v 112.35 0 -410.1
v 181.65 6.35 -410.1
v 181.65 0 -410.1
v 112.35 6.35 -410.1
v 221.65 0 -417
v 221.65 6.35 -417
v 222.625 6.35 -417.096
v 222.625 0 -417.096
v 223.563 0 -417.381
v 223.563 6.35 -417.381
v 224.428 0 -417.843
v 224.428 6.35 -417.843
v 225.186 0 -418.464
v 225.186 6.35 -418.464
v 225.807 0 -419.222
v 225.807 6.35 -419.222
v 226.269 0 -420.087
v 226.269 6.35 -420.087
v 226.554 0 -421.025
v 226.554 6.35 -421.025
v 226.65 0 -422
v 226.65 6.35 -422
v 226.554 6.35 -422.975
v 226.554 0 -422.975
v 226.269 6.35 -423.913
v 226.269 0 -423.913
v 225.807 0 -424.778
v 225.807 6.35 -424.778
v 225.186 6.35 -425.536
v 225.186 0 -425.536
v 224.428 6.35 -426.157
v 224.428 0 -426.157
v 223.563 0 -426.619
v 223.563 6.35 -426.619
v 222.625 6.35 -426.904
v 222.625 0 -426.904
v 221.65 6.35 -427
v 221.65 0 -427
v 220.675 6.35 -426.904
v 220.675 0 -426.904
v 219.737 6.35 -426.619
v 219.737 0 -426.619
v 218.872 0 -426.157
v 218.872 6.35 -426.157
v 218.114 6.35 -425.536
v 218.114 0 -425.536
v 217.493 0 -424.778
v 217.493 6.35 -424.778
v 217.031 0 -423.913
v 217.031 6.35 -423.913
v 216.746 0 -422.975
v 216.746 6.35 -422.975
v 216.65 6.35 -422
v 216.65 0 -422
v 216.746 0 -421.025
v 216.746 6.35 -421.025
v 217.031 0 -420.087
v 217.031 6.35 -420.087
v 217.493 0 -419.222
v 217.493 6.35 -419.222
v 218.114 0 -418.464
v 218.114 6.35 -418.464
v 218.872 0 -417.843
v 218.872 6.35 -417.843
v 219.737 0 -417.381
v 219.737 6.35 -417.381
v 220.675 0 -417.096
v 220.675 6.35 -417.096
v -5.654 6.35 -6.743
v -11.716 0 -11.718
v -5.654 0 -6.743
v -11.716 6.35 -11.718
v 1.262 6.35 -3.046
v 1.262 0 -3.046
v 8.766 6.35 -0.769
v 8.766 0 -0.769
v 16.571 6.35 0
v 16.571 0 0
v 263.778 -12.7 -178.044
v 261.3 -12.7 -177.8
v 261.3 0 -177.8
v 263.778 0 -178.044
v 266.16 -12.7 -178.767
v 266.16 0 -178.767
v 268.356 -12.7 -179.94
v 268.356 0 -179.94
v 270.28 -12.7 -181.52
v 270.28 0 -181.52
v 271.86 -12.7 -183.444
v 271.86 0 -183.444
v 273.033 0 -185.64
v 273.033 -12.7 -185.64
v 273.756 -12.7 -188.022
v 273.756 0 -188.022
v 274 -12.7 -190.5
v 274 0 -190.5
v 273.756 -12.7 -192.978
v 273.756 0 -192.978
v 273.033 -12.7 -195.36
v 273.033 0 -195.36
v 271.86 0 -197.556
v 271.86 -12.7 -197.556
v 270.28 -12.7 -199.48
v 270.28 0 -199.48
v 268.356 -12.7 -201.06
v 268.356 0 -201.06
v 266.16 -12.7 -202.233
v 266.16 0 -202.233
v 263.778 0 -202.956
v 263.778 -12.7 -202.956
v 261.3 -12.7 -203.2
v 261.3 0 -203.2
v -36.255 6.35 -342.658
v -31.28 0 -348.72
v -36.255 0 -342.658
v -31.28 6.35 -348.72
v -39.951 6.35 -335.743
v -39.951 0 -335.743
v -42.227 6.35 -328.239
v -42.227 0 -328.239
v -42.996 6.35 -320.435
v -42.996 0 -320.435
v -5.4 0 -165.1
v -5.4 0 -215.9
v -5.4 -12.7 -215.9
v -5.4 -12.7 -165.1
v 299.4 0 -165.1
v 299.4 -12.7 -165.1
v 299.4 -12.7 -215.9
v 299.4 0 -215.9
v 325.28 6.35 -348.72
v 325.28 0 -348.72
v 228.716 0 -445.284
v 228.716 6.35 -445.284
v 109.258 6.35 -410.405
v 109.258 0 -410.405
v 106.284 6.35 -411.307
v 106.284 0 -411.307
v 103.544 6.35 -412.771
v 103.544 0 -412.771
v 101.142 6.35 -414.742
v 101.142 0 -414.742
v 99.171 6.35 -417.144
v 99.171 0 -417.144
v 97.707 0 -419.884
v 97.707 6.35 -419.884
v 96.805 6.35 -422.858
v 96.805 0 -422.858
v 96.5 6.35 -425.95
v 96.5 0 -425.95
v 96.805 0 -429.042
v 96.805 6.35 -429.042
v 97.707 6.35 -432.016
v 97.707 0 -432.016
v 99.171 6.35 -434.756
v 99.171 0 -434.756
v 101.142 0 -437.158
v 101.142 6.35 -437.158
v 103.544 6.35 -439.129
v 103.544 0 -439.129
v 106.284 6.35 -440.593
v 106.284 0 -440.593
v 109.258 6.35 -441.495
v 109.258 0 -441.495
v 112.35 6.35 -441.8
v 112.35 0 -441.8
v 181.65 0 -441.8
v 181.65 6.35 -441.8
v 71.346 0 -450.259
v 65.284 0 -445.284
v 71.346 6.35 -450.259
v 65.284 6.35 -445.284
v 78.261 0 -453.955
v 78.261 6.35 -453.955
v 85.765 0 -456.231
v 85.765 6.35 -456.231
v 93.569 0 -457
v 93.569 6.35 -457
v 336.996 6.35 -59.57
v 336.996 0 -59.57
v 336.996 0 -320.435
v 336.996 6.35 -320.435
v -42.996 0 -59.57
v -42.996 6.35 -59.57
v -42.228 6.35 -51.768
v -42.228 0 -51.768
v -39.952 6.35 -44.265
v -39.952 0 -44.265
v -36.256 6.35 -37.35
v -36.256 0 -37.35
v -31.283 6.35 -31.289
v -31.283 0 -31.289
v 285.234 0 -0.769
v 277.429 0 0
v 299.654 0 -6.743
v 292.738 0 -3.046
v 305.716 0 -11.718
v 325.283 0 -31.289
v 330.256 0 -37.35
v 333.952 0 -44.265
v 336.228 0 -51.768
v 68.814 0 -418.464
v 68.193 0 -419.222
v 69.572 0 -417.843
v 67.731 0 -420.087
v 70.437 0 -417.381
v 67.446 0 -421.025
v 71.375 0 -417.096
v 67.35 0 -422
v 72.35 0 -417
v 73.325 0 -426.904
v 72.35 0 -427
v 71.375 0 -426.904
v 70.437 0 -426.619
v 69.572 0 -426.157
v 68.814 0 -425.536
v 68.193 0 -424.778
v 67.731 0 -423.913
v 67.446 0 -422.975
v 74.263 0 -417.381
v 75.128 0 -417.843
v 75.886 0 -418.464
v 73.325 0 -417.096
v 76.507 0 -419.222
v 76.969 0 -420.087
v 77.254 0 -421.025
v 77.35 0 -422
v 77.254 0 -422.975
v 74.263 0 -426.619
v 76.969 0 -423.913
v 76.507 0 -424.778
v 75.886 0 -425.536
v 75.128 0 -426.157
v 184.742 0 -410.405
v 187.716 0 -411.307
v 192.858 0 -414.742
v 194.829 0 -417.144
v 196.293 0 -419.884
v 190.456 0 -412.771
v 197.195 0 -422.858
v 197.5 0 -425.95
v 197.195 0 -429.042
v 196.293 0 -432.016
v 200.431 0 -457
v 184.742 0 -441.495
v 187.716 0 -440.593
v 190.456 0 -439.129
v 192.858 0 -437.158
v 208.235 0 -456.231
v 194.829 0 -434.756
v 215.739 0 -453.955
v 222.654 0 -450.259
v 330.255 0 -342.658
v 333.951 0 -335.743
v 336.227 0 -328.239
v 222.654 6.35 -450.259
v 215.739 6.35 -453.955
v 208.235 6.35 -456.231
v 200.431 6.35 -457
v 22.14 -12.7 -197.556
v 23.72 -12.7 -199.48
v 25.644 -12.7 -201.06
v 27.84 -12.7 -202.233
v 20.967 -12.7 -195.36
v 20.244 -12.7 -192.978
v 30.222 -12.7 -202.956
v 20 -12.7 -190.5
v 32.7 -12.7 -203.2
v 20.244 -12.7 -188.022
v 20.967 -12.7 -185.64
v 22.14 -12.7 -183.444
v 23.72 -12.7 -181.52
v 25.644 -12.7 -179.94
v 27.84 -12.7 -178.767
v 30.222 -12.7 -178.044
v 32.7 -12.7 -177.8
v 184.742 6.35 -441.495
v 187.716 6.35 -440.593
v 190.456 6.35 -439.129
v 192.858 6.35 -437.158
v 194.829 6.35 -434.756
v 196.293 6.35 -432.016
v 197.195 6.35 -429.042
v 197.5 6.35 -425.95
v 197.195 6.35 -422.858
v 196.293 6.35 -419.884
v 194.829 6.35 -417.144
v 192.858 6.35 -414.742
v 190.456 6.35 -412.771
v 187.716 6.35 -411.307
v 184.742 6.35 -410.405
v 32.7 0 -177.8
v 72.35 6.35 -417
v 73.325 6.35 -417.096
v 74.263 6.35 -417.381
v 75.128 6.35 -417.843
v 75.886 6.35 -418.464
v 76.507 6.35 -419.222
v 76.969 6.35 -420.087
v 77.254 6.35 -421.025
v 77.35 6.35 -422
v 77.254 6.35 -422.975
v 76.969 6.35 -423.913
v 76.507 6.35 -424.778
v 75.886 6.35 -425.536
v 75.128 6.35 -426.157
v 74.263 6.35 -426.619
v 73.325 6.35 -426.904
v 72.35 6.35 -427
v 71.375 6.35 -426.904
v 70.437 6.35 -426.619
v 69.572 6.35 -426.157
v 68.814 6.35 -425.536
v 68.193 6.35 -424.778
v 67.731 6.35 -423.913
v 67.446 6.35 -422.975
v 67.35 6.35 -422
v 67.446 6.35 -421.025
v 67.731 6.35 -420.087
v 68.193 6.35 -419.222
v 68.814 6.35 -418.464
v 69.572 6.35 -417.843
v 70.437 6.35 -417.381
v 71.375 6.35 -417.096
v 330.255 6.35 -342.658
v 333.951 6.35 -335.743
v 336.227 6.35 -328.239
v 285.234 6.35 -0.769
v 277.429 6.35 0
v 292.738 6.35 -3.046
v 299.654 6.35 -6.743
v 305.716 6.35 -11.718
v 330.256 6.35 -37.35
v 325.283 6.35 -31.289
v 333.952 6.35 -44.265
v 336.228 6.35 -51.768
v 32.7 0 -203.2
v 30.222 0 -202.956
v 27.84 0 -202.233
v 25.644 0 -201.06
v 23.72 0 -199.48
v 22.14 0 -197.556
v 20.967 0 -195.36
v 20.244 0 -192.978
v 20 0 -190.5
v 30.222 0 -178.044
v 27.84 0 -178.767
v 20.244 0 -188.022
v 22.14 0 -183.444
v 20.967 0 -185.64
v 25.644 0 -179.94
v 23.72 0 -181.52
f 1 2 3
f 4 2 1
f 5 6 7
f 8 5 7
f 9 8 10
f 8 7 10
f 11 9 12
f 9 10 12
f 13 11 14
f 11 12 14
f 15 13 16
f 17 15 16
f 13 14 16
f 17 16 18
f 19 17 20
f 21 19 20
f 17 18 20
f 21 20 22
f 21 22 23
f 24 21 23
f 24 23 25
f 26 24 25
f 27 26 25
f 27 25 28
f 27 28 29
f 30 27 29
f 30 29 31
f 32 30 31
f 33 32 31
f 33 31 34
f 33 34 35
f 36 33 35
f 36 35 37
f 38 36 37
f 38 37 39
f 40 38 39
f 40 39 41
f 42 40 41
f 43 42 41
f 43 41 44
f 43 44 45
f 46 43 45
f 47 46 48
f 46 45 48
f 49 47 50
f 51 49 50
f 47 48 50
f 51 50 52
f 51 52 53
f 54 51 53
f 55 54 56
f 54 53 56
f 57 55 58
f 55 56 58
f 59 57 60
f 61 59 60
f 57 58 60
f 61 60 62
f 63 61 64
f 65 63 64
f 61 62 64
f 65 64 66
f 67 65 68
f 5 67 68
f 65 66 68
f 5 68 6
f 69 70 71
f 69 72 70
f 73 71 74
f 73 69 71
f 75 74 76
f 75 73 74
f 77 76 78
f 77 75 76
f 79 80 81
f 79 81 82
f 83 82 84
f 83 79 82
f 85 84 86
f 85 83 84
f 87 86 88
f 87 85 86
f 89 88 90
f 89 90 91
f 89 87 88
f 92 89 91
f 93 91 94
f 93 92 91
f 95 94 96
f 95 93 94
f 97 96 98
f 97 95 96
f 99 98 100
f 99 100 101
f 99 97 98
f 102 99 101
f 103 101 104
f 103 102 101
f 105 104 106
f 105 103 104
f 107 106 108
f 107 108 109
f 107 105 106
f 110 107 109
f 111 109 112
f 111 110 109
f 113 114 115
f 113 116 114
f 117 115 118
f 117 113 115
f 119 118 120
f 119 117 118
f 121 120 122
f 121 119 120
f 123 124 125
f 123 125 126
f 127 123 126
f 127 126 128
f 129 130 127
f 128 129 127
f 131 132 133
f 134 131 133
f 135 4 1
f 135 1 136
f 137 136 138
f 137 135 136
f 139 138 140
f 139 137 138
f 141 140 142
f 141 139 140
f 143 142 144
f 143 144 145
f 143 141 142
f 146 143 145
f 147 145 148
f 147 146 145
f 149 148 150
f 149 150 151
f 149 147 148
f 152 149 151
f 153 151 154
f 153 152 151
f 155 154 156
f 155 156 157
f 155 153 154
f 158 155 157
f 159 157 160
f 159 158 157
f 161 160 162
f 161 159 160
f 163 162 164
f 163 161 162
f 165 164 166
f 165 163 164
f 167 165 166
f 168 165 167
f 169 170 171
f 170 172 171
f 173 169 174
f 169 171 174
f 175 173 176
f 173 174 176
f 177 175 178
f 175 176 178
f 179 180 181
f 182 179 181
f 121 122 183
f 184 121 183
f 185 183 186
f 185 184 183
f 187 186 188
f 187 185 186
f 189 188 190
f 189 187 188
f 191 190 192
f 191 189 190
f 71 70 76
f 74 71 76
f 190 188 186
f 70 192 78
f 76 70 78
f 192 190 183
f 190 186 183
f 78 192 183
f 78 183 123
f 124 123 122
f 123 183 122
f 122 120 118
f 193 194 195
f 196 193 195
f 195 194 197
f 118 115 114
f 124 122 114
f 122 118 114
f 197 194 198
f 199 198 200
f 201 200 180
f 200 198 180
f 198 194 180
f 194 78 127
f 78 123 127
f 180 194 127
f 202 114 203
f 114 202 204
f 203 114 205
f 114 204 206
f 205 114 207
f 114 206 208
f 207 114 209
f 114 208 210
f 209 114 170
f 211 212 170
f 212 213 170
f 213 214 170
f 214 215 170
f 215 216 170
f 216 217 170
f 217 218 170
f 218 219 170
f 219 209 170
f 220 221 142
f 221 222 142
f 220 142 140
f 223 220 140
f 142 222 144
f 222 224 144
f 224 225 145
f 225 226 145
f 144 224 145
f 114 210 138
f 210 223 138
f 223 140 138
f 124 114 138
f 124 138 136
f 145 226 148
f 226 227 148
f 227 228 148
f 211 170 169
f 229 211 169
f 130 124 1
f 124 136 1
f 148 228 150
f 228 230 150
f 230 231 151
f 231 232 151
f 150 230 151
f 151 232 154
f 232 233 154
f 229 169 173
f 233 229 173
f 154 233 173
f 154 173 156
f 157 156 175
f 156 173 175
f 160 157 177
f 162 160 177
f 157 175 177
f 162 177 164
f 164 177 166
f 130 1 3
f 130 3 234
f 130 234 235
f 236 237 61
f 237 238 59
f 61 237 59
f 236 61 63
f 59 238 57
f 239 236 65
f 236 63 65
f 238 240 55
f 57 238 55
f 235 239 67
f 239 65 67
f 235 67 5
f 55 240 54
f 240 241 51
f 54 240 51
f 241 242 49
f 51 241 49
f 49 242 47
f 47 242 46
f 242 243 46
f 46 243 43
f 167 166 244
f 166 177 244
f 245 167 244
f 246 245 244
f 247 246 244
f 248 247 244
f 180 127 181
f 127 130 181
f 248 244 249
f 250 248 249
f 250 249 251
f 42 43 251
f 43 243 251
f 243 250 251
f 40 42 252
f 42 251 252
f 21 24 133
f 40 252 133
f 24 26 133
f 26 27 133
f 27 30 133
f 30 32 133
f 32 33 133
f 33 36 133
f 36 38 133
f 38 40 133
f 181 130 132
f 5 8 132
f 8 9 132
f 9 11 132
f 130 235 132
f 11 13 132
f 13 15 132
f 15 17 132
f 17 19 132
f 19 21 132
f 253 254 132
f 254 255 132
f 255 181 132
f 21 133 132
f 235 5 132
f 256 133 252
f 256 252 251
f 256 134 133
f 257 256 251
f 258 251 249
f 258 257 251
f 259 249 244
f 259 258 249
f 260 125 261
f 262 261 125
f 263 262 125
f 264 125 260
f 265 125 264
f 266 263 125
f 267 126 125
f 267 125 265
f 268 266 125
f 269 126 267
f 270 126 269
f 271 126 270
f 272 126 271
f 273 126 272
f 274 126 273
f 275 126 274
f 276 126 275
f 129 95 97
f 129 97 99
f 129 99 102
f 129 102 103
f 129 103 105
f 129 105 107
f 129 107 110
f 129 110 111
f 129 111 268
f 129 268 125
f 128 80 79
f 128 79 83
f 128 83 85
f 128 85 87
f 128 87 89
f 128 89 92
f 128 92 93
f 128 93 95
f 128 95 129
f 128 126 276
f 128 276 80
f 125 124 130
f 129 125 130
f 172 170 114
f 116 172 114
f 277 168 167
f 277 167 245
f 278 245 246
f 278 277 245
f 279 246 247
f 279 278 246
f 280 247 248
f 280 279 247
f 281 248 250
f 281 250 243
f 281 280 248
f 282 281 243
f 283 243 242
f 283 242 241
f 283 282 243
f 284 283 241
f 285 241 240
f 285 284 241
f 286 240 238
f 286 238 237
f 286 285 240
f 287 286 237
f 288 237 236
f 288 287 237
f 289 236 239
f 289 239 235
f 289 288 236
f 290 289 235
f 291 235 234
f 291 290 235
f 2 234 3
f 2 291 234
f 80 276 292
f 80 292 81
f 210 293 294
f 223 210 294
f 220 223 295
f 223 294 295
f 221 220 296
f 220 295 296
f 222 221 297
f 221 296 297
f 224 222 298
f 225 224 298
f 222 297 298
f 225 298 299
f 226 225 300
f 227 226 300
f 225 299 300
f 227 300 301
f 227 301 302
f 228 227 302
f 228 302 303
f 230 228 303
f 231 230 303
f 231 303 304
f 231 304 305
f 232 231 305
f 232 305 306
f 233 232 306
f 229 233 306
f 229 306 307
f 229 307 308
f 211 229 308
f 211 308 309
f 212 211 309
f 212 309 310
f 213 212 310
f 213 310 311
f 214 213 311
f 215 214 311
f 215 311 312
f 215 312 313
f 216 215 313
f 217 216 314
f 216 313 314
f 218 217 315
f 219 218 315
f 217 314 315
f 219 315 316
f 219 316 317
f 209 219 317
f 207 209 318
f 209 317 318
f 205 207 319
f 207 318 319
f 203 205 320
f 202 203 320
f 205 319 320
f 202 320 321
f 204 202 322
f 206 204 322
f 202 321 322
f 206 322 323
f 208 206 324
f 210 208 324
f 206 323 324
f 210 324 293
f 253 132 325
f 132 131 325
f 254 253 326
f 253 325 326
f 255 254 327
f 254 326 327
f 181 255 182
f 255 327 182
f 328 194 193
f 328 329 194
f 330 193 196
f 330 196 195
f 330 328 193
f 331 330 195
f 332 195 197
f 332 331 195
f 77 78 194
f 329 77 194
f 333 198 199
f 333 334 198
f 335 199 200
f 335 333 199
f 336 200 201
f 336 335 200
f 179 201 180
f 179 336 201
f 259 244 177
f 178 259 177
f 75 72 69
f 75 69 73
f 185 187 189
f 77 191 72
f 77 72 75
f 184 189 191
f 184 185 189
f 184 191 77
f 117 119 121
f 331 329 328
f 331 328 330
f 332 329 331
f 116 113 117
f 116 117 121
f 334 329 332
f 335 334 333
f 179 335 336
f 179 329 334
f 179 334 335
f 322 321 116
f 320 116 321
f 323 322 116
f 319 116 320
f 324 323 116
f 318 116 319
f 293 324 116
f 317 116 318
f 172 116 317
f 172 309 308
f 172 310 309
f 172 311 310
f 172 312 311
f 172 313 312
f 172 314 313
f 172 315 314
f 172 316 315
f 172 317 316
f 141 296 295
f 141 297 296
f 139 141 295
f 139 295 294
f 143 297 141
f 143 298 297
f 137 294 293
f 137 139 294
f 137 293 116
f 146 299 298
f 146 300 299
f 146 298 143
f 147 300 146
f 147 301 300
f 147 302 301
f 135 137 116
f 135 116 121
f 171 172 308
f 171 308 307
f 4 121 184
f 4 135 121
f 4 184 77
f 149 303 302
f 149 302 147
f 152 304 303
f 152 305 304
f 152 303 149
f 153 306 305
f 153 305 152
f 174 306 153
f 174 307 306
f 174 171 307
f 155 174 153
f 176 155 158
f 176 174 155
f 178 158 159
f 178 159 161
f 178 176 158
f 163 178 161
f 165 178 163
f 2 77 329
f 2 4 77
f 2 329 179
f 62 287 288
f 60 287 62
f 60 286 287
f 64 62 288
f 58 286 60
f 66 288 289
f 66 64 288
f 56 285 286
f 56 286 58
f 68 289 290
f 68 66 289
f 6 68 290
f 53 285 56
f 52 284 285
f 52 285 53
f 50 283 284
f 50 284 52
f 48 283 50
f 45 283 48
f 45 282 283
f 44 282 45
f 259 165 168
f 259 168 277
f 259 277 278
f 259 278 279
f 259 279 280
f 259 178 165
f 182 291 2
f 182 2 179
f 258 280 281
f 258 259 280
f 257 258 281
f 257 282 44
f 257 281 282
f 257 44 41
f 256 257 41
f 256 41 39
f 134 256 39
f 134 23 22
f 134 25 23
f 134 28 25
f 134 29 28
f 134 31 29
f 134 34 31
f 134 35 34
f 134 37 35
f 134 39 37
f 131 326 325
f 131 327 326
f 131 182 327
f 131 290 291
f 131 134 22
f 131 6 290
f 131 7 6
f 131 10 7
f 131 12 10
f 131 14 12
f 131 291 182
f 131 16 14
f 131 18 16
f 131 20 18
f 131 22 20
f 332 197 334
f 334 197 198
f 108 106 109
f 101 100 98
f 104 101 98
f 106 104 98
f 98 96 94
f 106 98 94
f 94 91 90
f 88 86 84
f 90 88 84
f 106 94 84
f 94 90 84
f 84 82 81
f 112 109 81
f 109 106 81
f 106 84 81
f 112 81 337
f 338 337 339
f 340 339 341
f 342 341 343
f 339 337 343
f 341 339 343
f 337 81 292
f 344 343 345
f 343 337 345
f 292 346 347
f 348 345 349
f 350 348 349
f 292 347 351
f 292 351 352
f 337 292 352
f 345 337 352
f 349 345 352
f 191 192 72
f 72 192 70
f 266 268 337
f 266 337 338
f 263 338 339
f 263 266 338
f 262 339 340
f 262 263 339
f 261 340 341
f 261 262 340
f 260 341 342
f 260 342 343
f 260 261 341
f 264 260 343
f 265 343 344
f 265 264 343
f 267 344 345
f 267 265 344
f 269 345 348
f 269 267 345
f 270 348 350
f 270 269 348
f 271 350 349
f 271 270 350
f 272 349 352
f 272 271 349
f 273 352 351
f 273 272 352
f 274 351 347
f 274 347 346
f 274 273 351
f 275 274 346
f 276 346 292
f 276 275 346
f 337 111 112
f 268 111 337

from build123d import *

# Parameters (mm, degrees)
BODY_DEPTH                    = 6.35
HANDLE_DEPTH                  = 6.35
SKETCH11_R                    = 5
LOCKING_MECHANISM_HOLES_DEPTH = 6.36
FILLET1_R                     = 40
FILLET2_R                     = 40
SKETCH12_W                    = 304.8
SKETCH12_H                    = 50.8
BOSS_EXTRUDE1_DEPTH           = 12.7
CUT_EXTRUDE3_DEPTH            = 12.7


with BuildPart() as part:
    # Sketch1 → Body (new body)
    with BuildSketch(Plane(origin=(0, 0, 0), x_dir=(1, 0, 0), z_dir=(0, 1, 0))):
        Polygon((0, 0), (294, 0), (336.996020767, 43.003978862), (336.996020767, 337.003978862), (217, 456.999999629), (77, 456.999999629), (-42.996020767, 337.003978862), (-42.996020767, 43.003978862), align=None)
    extrude(amount=BODY_DEPTH)

    # Sketch2 → Handle (cut)
    with BuildSketch(Plane(origin=(0, 6.35, 0), x_dir=(1, 0, 0), z_dir=(0, 1, 0))):
        with BuildLine():
            Line((112.35, 441.799999629), (181.65, 441.799999629))
            ThreePointArc((181.65, 441.799999629), (197.5, 425.949999629), (181.65, 410.099999629))
            Line((181.65, 410.099999629), (112.35, 410.099999629))
            ThreePointArc((112.35, 410.099999629), (96.5, 425.949999629), (112.35, 441.799999629))
        make_face()
    extrude(amount=-HANDLE_DEPTH, mode=Mode.SUBTRACT)

    # Sketch11 → Locking Mechanism Holes (cut)
    with BuildSketch(Plane(origin=(0, 6.35, 0), x_dir=(1, 0, 0), z_dir=(0, 1, 0))):
        with Locations(Location((221.65, 421.999999629, 0), (0, 0, 270))):
            Circle(SKETCH11_R)
        with Locations(Location((72.35, 421.999999629, 0), (0, 0, 270))):
            Circle(SKETCH11_R)
    extrude(amount=-LOCKING_MECHANISM_HOLES_DEPTH, mode=Mode.SUBTRACT)

    # Fillet1
    fillet1_edges = [part.edges().sort_by_distance(p)[0] for p in [
        (77, 3.175, -456.999999629),
        (217, 3.175, -456.999999629),
    ]]
    fillet(fillet1_edges, radius=FILLET1_R)

    # Fillet2
    fillet2_edges = [part.edges().sort_by_distance(p)[0] for p in [
        (-42.996020767, 3.175, -43.003978862),
        (-42.996020767, 3.175, -337.003978862),
        (336.996020767, 3.175, -337.003978862),
        (336.996020767, 3.175, -43.003978862),
        (294, 3.175, 0),
        (0, 3.175, 0),
    ]]
    fillet(fillet2_edges, radius=FILLET2_R)

    # Sketch12 → Boss-Extrude1 (add)
    with BuildSketch(Plane.XZ):
        with Locations((147, -190.5)):
            Rectangle(SKETCH12_W, SKETCH12_H)
    extrude(amount=BOSS_EXTRUDE1_DEPTH)

    # Sketch13 → Cut-Extrude3 (cut)
    with BuildSketch(Plane.XZ.offset(12.7)):
        with BuildLine():
            Line((261.3, -203.2), (32.7, -203.2))
            ThreePointArc((32.7, -203.2), (20, -190.5), (32.7, -177.8))
            Line((32.7, -177.8), (261.3, -177.8))
            ThreePointArc((261.3, -177.8), (274, -190.5), (261.3, -203.2))
        make_face()
    extrude(amount=-CUT_EXTRUDE3_DEPTH, mode=Mode.SUBTRACT)


solid = part.part
